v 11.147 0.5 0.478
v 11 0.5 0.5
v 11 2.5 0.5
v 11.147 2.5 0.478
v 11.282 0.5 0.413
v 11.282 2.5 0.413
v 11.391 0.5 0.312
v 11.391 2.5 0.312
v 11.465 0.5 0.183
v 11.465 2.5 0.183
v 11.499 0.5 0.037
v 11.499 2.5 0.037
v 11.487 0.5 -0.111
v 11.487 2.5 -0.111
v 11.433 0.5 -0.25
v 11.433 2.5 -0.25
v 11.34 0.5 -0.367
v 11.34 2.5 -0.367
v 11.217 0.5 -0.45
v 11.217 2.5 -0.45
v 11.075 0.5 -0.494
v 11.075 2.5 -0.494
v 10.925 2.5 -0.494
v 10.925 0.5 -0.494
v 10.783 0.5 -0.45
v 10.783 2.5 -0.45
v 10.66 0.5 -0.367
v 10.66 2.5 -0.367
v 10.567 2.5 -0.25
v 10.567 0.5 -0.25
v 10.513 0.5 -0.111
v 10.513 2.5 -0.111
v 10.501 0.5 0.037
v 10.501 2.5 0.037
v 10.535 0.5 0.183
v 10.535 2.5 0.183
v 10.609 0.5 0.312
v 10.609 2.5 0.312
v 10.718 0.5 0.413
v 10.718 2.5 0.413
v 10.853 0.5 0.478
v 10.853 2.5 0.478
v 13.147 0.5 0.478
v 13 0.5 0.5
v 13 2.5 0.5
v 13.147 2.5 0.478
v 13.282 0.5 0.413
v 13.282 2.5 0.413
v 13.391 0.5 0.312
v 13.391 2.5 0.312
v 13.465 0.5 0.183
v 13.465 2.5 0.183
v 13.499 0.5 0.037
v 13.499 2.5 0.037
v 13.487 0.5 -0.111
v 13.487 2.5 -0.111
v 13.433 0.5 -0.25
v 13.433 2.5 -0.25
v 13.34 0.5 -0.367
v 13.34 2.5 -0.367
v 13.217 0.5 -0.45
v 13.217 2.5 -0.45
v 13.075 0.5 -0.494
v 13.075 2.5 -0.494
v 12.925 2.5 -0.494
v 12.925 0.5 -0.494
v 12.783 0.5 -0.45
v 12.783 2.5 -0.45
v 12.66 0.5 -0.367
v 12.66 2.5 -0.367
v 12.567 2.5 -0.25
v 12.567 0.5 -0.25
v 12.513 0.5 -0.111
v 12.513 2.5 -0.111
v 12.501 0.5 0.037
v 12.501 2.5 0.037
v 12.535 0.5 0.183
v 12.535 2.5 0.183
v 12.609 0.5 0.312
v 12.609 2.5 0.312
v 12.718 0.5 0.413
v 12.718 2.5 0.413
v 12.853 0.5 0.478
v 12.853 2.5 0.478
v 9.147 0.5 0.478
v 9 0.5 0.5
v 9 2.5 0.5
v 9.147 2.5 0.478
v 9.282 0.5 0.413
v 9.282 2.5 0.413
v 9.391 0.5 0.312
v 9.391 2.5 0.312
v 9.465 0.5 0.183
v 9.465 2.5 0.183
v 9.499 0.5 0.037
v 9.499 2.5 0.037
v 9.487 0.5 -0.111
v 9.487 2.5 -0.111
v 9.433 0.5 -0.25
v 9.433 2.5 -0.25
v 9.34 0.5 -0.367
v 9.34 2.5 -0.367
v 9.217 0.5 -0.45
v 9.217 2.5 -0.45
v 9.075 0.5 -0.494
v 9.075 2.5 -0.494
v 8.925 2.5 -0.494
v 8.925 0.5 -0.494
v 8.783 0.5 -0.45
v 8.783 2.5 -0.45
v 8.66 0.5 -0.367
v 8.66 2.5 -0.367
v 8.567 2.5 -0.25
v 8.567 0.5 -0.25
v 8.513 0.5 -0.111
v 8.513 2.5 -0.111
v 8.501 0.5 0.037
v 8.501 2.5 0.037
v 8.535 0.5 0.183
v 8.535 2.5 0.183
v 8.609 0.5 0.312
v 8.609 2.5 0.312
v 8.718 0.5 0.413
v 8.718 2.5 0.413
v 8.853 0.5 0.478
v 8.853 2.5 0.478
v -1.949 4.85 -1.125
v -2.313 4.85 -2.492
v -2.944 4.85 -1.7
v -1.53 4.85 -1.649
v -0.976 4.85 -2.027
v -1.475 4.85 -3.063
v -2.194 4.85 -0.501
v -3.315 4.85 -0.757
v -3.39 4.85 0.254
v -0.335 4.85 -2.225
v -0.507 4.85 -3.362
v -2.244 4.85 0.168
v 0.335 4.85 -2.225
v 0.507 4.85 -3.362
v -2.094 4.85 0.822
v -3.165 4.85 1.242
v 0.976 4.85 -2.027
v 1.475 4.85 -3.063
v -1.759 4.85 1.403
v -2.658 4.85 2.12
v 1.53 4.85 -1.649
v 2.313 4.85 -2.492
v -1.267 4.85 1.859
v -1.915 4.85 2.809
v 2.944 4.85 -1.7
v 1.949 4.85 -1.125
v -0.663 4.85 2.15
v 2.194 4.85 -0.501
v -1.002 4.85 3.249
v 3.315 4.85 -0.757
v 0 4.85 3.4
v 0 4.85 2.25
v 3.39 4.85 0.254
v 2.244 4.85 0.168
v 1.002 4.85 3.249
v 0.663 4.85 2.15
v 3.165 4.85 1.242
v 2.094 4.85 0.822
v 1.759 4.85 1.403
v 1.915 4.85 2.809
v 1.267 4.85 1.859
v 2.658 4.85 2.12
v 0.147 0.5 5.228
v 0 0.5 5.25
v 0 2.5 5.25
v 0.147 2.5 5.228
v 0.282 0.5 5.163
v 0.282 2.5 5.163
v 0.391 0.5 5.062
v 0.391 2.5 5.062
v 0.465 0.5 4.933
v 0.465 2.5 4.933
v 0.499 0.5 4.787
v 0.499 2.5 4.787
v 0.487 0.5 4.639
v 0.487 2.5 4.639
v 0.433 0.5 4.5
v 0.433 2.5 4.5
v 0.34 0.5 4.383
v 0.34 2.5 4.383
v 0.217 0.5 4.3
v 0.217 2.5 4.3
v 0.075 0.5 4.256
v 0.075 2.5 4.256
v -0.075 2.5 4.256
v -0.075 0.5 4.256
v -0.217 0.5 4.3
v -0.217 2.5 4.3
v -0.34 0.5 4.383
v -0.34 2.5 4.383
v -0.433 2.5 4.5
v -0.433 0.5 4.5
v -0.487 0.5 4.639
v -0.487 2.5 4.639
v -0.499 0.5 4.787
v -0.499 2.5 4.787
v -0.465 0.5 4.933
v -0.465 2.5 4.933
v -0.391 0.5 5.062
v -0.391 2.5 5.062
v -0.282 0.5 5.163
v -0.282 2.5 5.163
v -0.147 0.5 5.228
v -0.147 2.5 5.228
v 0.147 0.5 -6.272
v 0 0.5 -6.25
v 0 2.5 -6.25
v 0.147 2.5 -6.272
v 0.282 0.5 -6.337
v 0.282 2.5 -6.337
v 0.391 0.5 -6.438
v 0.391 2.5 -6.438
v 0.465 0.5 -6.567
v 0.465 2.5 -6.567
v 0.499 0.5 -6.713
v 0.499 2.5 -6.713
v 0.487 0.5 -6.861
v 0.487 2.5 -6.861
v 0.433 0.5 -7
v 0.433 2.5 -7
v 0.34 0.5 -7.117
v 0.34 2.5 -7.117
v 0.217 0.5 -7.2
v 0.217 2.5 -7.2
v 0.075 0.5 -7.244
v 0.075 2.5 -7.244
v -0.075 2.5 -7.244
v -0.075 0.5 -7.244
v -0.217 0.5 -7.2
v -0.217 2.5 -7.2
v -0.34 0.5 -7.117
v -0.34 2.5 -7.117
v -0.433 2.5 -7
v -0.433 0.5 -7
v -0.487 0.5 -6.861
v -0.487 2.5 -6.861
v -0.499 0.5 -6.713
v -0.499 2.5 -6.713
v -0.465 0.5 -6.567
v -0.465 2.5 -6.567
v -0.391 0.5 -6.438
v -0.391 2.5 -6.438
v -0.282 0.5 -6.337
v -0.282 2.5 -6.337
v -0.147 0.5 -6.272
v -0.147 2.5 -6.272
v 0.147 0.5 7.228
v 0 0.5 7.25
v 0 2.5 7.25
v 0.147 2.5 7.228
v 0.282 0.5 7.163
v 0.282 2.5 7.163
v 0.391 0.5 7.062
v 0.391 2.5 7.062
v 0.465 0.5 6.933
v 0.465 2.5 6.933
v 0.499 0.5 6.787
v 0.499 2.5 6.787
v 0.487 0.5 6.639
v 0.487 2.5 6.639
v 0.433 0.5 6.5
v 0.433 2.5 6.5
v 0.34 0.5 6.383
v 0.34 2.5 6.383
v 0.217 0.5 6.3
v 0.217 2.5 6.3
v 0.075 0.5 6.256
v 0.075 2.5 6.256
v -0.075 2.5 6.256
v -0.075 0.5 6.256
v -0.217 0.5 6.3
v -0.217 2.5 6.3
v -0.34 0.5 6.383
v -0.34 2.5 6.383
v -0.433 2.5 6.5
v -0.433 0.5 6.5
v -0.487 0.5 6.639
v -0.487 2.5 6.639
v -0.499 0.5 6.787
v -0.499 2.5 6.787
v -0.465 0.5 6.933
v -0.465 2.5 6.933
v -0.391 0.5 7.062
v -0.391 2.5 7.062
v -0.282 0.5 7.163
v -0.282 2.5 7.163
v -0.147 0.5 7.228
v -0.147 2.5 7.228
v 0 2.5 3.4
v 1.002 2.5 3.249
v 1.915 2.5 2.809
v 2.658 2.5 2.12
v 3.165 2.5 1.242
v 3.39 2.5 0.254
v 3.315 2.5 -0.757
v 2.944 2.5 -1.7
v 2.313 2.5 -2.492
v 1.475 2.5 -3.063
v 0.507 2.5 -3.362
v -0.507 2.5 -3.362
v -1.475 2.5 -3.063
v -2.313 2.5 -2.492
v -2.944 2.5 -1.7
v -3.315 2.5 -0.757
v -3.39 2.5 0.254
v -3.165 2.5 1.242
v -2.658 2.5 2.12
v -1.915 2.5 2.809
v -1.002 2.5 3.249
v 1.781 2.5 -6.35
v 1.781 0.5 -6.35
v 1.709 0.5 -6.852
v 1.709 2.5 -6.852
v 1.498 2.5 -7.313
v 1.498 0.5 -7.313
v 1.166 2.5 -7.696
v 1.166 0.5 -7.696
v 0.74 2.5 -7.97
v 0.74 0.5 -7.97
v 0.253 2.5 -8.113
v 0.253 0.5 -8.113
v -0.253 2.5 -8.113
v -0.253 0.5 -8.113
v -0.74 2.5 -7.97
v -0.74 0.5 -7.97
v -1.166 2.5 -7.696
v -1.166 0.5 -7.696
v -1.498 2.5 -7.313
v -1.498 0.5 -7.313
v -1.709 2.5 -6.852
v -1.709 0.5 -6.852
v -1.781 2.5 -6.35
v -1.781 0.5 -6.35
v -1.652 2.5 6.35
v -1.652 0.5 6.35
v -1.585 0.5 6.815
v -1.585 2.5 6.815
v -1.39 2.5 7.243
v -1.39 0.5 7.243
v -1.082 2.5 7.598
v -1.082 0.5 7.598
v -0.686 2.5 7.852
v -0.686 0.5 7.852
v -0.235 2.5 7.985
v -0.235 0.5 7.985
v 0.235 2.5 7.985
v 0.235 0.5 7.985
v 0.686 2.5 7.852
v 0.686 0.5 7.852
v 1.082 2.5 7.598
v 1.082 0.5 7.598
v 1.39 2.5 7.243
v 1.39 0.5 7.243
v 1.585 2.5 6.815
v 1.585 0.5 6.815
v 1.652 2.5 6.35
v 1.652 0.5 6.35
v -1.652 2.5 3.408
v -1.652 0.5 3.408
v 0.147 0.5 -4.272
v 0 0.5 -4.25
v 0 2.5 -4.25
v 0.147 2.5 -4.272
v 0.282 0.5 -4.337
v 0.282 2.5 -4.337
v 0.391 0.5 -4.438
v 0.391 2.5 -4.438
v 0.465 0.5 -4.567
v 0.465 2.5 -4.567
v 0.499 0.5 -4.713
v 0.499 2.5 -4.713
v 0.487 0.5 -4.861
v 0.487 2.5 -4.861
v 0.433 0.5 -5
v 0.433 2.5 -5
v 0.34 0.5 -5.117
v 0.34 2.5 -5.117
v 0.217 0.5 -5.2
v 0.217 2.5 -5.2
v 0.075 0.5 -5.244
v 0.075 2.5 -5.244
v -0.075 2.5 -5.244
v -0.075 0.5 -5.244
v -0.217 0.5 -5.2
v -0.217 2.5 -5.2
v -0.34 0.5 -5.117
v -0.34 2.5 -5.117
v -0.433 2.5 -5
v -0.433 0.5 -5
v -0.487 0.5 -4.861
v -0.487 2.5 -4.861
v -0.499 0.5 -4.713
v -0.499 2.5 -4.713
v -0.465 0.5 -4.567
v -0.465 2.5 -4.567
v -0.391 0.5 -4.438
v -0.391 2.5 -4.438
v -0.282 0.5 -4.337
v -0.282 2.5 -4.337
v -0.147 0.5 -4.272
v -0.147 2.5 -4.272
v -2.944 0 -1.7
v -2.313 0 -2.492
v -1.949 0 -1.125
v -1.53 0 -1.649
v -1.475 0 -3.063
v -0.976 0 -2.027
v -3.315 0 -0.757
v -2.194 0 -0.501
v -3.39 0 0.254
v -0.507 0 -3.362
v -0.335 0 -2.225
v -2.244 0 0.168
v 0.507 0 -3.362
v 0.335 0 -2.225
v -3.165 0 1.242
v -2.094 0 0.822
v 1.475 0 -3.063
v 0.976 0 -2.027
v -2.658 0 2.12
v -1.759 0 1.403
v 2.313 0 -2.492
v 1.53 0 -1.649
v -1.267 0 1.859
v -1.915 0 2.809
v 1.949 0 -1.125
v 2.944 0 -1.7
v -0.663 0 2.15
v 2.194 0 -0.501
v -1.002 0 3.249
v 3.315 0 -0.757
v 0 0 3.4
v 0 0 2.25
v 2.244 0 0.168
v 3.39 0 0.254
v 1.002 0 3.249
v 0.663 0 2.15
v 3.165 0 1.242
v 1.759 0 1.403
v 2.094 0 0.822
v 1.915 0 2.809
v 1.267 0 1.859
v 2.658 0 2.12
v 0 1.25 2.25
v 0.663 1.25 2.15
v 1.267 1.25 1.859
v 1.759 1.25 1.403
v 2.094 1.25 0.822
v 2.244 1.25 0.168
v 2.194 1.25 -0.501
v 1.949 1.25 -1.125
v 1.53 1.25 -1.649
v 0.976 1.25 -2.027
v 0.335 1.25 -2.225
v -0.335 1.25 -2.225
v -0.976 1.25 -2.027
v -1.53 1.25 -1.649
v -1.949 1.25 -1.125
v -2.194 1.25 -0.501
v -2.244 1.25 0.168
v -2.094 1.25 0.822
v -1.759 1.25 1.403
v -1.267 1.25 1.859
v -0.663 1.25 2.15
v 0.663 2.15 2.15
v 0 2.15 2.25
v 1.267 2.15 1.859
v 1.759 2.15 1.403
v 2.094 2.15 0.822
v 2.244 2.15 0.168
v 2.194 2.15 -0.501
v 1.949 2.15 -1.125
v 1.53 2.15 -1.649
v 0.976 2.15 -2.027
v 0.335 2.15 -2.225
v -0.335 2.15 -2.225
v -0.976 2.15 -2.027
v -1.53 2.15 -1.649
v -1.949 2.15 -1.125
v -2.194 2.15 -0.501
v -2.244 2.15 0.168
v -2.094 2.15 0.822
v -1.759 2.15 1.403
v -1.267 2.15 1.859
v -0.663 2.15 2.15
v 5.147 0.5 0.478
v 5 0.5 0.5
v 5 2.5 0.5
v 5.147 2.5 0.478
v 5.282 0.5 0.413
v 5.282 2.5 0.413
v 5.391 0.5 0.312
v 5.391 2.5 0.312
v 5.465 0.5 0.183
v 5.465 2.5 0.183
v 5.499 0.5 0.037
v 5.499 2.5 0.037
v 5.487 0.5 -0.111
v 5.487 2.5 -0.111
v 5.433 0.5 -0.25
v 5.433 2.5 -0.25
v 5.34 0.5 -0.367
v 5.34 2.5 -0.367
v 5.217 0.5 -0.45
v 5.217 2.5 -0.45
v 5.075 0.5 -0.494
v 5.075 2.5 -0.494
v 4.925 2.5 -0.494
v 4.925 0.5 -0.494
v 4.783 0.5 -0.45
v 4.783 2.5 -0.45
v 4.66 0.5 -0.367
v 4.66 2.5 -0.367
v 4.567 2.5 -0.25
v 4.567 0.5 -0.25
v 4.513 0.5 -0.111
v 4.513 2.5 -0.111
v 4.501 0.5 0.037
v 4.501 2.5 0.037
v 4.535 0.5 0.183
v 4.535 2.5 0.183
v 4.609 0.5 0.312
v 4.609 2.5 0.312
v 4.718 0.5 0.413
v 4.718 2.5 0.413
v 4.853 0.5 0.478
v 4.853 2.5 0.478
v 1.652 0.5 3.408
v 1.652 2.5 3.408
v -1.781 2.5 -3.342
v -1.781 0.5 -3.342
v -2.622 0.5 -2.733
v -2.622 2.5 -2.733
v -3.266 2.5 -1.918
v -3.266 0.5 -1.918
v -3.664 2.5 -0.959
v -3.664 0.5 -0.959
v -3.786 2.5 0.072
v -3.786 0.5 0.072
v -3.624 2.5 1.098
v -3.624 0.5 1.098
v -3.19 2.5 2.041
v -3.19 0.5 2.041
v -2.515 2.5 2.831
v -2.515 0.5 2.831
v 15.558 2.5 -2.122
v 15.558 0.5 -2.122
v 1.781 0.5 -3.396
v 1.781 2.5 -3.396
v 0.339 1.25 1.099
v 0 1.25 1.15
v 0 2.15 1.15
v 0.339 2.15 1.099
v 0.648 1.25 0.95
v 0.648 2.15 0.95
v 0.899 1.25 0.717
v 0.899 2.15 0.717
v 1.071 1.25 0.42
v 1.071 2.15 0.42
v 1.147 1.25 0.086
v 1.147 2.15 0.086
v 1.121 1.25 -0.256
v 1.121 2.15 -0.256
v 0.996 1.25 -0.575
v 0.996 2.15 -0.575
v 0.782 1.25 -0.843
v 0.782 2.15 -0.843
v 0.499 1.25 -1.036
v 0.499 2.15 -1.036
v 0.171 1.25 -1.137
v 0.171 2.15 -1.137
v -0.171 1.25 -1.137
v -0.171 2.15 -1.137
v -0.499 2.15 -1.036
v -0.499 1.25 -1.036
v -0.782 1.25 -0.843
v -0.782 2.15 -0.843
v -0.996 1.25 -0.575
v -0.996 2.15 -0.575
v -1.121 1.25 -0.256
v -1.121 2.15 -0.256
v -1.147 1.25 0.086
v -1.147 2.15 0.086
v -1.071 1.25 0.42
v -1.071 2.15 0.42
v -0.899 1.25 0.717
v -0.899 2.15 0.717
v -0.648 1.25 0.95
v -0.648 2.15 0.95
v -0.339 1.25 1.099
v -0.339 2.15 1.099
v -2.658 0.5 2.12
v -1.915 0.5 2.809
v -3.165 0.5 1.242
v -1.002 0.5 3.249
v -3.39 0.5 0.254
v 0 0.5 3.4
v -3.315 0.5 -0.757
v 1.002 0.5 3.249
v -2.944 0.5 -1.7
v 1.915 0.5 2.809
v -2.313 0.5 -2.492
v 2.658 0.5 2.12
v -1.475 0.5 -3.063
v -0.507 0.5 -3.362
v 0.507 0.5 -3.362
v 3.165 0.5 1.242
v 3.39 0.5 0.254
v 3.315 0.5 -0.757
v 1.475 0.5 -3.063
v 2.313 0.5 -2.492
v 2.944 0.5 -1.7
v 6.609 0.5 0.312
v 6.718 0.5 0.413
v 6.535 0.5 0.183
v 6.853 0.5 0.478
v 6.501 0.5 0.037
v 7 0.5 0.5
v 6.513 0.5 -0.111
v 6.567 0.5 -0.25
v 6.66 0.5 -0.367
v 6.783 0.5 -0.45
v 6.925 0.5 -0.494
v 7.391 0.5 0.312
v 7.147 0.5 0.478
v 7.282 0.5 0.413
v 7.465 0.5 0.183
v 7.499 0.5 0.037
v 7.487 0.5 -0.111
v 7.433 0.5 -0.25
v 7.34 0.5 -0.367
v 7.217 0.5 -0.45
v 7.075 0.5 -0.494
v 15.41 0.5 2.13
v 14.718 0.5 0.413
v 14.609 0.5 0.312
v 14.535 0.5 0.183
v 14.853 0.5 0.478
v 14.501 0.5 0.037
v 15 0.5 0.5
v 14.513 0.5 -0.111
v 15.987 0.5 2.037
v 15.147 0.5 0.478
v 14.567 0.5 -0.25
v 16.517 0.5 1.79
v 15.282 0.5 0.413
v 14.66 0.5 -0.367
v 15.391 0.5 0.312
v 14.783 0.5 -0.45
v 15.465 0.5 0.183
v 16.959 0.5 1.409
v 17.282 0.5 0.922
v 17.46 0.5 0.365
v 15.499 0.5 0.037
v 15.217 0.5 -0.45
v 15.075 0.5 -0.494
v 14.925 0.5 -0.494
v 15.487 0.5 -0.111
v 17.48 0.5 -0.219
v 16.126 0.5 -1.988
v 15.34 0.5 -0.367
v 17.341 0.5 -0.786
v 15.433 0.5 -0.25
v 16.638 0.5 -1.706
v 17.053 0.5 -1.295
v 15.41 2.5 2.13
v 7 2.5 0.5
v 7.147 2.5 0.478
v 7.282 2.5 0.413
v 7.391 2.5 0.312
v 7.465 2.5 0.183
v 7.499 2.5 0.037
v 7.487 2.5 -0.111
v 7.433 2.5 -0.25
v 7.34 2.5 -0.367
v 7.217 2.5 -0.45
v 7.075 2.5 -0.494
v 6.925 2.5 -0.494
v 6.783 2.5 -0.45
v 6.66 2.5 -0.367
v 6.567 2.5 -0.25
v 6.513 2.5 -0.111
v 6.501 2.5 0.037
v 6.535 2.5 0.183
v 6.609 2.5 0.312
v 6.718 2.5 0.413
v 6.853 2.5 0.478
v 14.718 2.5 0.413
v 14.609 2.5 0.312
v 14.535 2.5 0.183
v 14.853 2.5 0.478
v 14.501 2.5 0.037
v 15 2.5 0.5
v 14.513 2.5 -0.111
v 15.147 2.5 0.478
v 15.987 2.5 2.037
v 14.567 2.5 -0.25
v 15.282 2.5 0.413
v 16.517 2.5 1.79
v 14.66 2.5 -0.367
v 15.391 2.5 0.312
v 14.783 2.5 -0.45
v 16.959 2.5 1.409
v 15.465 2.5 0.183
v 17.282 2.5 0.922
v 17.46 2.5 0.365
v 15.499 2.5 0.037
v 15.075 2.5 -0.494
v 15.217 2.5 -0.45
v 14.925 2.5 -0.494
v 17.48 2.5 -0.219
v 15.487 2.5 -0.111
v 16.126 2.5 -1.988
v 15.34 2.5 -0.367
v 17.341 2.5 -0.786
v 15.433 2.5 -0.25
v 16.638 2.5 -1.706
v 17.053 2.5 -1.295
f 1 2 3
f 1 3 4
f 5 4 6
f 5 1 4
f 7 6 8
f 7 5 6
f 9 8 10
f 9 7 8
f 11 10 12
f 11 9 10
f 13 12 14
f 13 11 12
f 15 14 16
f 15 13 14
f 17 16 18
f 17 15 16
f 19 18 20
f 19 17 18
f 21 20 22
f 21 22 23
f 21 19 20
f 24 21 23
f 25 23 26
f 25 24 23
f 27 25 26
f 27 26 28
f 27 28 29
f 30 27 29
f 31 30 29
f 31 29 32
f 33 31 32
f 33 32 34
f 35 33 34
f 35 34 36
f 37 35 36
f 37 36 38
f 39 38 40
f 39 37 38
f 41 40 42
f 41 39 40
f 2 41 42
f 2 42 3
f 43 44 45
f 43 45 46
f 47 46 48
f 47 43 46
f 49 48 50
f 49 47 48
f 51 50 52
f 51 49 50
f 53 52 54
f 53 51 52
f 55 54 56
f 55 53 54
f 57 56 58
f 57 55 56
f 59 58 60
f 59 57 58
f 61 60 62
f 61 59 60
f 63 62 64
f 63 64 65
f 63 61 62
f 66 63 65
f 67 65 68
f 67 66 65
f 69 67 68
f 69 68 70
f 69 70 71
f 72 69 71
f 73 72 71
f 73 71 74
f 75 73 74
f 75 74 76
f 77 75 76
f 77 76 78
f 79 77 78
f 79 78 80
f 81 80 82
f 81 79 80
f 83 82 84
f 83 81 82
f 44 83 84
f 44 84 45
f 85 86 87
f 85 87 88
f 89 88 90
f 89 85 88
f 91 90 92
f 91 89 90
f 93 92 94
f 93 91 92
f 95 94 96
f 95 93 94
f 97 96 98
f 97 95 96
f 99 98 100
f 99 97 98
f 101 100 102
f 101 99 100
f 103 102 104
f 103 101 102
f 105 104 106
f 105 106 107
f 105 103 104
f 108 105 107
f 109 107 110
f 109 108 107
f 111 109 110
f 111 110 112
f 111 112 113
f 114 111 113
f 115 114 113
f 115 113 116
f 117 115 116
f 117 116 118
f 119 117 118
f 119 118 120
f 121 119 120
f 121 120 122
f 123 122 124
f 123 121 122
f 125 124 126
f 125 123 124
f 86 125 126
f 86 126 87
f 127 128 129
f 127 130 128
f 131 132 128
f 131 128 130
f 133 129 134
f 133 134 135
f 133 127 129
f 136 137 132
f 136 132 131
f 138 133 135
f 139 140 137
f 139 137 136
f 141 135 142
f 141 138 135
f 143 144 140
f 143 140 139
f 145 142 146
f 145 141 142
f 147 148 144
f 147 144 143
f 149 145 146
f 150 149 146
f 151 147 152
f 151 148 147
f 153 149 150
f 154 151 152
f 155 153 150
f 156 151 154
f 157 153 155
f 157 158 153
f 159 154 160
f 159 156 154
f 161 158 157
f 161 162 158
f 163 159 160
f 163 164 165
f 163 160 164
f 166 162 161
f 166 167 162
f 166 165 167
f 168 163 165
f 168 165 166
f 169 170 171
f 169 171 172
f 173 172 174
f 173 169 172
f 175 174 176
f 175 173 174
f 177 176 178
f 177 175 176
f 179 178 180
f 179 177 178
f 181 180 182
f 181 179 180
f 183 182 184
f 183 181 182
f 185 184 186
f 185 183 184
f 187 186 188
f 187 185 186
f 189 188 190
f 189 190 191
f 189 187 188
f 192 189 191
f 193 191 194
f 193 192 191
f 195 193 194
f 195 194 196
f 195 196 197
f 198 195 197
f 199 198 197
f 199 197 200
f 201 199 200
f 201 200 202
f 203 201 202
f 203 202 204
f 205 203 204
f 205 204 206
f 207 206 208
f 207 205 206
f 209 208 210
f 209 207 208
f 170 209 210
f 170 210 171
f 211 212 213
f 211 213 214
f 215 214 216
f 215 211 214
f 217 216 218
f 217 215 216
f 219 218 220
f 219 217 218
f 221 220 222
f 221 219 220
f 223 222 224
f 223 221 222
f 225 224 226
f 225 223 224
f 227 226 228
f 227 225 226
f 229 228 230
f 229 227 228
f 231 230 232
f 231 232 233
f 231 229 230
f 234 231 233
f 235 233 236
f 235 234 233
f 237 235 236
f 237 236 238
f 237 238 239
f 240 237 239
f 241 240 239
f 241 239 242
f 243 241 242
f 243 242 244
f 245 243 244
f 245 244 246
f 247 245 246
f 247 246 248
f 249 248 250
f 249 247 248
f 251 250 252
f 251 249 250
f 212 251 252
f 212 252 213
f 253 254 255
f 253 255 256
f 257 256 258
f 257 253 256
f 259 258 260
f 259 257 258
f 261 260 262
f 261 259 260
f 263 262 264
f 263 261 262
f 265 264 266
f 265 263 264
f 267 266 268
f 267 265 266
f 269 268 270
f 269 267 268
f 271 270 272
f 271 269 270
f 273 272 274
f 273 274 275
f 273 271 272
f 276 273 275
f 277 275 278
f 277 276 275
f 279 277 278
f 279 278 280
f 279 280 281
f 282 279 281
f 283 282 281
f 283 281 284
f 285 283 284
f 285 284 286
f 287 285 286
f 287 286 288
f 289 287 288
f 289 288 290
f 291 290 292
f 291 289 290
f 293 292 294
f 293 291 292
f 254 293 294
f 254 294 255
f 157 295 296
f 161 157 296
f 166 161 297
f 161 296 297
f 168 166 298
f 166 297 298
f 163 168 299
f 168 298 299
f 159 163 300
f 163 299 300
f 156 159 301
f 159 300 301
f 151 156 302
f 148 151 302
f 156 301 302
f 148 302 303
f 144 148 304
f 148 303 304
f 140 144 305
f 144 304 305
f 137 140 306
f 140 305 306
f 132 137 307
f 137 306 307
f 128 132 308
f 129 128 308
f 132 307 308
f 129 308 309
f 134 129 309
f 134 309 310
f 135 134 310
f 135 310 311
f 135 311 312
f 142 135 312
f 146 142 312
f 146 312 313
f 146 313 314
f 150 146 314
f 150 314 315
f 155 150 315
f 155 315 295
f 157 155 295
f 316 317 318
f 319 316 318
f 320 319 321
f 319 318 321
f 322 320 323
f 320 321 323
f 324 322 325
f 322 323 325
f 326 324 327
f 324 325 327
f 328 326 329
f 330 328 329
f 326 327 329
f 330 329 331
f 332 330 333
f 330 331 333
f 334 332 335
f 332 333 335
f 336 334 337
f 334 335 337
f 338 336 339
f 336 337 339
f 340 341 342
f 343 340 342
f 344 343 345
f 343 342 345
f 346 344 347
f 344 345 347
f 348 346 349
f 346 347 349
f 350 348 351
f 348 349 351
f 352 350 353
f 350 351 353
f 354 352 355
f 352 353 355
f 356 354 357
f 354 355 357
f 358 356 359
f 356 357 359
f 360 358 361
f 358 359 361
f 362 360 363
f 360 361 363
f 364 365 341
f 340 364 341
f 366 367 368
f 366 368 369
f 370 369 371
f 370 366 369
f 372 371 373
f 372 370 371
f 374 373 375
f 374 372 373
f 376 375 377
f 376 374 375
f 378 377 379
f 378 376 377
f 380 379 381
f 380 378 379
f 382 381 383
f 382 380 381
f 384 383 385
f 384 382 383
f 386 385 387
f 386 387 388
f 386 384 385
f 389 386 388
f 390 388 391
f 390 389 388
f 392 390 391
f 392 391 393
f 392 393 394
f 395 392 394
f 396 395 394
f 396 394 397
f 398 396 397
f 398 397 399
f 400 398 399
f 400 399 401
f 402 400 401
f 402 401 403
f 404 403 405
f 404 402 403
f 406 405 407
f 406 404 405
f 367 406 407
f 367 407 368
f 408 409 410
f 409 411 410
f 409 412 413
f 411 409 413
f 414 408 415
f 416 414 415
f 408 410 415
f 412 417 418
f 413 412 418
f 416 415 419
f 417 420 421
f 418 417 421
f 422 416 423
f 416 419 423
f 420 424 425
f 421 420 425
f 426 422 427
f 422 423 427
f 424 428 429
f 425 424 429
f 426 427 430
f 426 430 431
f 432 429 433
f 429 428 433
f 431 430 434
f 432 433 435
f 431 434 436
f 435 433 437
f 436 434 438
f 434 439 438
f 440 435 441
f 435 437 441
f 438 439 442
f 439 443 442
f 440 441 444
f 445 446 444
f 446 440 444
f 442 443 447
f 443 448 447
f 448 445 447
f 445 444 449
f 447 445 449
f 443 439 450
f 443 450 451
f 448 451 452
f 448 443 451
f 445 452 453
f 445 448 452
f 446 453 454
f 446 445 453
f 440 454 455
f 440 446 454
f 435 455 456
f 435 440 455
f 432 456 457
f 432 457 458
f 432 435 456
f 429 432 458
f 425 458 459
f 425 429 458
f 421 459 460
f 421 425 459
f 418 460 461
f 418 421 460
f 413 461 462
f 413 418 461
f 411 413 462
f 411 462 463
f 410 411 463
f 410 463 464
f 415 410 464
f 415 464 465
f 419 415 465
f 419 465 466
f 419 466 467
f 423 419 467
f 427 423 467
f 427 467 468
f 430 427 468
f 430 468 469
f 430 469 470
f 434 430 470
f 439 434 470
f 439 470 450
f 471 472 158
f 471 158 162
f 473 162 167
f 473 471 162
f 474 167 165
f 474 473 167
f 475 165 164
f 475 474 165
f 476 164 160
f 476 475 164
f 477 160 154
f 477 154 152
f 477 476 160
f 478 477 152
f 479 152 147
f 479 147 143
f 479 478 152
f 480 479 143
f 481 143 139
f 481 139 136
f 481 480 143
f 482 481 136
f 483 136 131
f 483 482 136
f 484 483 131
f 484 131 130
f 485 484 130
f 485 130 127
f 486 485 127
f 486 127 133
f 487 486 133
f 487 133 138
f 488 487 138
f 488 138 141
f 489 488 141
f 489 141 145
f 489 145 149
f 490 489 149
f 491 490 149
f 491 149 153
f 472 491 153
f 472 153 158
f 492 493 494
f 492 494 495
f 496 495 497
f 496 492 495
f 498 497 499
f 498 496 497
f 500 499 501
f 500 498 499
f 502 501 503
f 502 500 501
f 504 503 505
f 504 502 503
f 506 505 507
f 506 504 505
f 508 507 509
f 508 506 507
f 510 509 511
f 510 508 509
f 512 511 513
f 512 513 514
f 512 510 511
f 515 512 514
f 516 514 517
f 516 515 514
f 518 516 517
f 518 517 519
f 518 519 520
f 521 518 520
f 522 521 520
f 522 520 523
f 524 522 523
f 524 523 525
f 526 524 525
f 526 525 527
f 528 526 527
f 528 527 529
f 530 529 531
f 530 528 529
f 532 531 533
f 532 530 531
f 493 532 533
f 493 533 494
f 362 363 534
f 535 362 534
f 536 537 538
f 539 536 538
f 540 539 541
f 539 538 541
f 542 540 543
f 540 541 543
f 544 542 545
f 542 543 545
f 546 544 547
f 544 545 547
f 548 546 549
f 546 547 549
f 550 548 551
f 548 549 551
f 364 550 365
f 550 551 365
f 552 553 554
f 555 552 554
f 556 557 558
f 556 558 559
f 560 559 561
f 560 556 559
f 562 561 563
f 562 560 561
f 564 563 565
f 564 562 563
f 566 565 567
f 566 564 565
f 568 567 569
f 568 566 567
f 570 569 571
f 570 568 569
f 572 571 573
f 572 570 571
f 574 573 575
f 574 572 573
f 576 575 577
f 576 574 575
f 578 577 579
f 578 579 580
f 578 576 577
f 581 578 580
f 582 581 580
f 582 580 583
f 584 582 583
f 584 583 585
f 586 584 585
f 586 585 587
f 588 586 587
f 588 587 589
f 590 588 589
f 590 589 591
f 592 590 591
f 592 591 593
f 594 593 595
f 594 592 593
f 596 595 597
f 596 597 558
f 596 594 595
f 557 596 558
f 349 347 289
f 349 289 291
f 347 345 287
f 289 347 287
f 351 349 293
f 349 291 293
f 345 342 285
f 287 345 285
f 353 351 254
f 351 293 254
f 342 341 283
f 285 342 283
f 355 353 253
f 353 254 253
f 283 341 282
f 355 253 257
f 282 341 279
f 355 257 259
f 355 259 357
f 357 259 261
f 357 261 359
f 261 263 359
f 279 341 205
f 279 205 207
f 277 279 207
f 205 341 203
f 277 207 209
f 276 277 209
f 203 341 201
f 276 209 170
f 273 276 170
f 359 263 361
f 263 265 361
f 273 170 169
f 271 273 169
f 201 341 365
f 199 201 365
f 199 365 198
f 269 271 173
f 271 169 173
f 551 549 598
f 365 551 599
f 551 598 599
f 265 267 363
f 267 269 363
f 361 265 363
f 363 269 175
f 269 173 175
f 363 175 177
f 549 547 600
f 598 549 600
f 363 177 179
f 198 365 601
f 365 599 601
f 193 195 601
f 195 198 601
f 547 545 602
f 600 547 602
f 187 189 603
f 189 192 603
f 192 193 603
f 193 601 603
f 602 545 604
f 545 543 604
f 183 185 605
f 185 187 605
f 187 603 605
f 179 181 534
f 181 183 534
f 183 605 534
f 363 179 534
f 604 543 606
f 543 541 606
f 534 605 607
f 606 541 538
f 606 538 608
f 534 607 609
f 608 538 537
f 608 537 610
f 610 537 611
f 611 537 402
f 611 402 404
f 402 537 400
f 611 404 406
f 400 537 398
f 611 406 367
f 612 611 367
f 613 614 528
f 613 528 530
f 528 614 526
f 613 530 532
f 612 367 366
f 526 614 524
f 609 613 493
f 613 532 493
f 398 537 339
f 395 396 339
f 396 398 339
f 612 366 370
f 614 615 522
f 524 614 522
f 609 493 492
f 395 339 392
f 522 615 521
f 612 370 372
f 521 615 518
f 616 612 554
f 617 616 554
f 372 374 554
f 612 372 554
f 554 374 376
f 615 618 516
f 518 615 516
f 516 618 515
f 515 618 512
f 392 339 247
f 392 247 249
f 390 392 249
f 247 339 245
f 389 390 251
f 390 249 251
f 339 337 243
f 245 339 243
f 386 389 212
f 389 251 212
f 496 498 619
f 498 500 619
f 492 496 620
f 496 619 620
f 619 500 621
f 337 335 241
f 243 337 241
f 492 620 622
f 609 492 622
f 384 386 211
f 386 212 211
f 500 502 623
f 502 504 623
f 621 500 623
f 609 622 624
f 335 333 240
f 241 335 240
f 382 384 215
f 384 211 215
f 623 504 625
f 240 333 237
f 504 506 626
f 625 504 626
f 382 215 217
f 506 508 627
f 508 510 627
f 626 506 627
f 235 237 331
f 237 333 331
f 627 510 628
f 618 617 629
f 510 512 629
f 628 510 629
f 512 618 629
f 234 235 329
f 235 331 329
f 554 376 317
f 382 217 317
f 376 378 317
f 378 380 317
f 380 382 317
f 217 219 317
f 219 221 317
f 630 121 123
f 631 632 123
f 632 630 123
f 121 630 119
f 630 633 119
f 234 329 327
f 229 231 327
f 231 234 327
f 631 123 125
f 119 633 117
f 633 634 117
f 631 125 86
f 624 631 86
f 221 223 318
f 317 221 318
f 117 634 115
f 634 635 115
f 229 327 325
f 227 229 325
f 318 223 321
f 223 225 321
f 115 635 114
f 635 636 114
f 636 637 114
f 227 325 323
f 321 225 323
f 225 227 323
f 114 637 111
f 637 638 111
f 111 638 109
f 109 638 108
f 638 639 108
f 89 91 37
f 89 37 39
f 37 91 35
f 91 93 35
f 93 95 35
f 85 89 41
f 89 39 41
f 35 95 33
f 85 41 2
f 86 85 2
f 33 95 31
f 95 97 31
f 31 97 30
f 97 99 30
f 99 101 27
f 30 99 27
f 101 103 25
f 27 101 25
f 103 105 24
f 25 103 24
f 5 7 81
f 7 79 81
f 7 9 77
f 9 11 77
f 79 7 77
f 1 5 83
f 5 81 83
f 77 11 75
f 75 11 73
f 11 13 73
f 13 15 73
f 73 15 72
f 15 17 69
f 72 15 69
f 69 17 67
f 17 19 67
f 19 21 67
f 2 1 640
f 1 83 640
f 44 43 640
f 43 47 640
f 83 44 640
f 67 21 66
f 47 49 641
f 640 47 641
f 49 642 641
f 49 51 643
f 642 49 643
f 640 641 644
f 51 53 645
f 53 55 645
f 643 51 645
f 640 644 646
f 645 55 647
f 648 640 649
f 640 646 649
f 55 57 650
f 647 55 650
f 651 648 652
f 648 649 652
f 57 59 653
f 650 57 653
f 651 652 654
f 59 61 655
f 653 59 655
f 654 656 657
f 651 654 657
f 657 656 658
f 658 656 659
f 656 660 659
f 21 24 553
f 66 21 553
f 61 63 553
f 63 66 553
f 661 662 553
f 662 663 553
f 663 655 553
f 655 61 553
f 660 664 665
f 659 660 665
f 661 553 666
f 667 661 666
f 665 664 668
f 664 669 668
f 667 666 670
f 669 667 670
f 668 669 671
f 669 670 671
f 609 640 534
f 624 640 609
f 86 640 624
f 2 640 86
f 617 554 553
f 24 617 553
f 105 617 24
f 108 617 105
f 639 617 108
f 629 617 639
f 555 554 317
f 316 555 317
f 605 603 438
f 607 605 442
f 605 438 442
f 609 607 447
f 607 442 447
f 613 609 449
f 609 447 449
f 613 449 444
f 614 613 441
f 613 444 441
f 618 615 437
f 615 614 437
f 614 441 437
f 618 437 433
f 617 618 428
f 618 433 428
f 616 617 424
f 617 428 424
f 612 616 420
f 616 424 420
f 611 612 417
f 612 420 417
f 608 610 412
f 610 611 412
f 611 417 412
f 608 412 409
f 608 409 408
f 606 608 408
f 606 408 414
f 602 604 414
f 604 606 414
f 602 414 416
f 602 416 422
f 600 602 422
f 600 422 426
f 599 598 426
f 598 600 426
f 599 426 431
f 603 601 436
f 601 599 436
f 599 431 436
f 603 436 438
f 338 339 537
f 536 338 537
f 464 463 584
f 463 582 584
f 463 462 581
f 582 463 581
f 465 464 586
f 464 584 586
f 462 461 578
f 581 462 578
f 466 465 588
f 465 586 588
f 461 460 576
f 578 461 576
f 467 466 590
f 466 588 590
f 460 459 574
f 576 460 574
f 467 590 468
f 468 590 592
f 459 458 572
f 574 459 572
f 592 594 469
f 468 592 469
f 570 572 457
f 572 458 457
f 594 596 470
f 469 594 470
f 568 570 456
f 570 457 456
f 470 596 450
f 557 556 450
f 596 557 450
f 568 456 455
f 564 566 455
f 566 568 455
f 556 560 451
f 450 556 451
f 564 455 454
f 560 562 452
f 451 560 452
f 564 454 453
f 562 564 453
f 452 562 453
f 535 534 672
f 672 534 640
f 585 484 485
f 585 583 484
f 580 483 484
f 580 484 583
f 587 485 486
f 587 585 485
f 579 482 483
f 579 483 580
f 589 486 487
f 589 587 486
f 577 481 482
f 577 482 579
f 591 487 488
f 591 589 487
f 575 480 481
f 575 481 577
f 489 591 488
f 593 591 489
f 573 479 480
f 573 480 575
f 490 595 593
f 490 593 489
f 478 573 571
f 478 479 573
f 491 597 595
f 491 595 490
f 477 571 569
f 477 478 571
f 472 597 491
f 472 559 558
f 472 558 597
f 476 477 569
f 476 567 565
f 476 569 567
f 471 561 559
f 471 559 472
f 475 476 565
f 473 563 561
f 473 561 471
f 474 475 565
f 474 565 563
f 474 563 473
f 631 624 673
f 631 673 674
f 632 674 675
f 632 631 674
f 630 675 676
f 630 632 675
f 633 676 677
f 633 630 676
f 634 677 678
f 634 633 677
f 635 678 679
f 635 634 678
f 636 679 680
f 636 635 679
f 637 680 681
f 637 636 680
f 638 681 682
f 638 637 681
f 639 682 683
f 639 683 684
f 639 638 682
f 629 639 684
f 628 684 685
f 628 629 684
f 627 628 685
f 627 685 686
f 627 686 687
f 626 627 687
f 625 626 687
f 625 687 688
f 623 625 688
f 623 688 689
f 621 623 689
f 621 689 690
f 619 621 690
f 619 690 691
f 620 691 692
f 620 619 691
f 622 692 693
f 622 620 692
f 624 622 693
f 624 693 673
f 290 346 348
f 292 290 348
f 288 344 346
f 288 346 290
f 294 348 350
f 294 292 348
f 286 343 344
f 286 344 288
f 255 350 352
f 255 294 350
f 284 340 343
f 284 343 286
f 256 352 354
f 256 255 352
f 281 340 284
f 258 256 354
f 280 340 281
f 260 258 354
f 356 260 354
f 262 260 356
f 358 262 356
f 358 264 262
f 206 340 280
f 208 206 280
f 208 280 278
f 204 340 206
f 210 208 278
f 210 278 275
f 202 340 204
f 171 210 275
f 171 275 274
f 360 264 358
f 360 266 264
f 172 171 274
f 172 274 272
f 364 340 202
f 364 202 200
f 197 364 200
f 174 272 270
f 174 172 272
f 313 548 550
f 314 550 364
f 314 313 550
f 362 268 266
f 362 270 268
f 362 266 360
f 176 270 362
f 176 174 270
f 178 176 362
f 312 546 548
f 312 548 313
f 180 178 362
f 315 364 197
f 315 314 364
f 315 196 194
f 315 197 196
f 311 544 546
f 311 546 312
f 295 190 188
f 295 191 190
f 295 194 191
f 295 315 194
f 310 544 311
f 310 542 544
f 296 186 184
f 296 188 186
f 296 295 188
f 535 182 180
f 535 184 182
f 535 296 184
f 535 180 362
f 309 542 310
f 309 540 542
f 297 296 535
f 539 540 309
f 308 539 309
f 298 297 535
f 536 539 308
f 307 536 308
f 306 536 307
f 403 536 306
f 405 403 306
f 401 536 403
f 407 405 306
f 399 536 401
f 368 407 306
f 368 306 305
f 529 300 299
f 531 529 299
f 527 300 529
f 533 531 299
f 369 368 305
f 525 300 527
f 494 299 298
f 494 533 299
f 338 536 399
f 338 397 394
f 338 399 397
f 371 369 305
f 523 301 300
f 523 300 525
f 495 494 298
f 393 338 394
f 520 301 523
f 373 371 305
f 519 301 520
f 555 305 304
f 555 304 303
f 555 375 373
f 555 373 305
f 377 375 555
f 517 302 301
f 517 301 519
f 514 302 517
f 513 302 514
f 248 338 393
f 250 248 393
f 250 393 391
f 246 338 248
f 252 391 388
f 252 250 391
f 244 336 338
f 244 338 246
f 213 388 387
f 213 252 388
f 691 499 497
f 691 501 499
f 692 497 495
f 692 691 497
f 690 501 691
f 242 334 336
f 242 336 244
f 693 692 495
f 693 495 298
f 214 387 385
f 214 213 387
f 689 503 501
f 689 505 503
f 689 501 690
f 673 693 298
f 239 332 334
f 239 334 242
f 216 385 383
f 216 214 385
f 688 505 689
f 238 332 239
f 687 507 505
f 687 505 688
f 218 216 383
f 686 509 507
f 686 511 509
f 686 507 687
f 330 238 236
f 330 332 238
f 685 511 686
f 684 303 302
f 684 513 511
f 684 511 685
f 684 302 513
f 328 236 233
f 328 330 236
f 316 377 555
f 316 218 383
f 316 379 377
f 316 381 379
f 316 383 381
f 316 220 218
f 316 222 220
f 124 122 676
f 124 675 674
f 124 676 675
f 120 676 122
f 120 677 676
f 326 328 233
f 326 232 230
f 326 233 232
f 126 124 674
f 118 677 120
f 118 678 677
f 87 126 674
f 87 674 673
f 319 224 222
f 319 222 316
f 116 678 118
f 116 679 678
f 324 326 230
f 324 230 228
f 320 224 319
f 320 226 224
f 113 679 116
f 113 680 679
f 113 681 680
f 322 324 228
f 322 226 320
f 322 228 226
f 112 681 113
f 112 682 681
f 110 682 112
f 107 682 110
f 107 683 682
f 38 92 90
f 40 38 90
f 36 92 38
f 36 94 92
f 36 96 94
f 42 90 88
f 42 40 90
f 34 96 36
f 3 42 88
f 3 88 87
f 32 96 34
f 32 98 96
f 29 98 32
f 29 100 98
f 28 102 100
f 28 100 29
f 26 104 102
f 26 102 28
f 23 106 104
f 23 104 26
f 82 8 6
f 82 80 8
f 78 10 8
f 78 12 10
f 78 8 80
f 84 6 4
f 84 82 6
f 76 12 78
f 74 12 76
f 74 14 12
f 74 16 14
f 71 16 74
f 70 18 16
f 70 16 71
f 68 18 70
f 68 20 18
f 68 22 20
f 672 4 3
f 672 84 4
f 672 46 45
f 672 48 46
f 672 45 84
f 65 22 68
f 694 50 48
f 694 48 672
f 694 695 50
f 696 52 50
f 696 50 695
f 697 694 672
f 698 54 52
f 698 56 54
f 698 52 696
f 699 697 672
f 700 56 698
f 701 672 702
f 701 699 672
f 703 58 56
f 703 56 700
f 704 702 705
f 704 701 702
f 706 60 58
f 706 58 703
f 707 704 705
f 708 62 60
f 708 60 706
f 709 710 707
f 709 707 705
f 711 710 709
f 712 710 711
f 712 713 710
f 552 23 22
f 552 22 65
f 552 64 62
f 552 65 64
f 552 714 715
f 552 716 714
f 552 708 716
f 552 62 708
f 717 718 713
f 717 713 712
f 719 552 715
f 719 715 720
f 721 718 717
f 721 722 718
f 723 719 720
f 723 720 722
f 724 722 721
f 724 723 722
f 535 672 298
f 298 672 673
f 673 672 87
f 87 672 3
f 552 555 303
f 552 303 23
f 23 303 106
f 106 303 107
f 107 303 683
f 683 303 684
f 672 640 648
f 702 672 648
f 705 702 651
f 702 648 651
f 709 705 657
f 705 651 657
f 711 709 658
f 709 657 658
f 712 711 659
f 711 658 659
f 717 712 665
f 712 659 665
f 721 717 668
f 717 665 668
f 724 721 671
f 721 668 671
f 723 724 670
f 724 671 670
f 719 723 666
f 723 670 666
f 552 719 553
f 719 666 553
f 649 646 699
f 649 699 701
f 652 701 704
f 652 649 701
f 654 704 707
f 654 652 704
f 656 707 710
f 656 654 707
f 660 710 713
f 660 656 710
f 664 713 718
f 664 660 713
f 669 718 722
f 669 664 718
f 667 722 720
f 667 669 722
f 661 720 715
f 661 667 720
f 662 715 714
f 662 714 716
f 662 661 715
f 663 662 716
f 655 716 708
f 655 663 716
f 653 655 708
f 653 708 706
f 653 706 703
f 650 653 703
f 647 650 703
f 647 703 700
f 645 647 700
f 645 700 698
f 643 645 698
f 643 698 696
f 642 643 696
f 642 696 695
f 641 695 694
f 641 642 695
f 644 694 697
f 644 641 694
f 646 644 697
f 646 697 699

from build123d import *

# Parameters (mm, degrees)
SKETCH_1_R      = 3.4
SKETCH_1_R_2    = 2.25
EXTRUDE_1_DEPTH = 4.85
EXTRUDE_START   = 0.5
SKETCH_2_R      = 2.25
SKETCH_2_R_2    = 0.5
EXTRUDE_2_DEPTH = 2
EXTRUDE_START_2 = 1.25
SKETCH_3_R      = 2.25
SKETCH_3_R_2    = 1.15
EXTRUDE_3_DEPTH = 0.9


with BuildPart() as part:
    # 草图1 → 凸台-拉伸1 (new body)
    with BuildSketch(Plane(origin=(0, 0, 0), x_dir=(1, 0, 0), z_dir=(0, 1, 0))):
        with Locations(Location((0, 0, 0), (0, 0, 270))):
            Circle(SKETCH_1_R)
        with Locations(Location((0, 0, 0), (0, 0, 270))):
            Circle(SKETCH_1_R_2, mode=Mode.SUBTRACT)
    extrude(amount=EXTRUDE_1_DEPTH)

    # 草图2 → 凸台-拉伸2 (add)
    with BuildSketch(Plane(origin=(0, 0, 0), x_dir=(1, 0, 0), z_dir=(0, 1, 0)).offset(EXTRUDE_START)):
        with BuildLine():
            Line((1.781000011, 3.395903963), (1.781000011, 6.35))
            ThreePointArc((1.781000011, 6.35), (0, 8.13100001), (-1.781000011, 6.35))
            Line((-1.781000011, 6.35), (-1.781000011, 3.342130588))
            ThreePointArc((-1.781000011, 3.342130588), (-3.786362647, -0.072496957), (-1.651758938, -3.407857144))
            Line((-1.651758938, -3.407857144), (-1.651758938, -6.35))
            ThreePointArc((-1.651758938, -6.35), (0, -8.001758939), (1.651758938, -6.35))
            Line((1.651758938, -6.35), (1.651758938, -3.407857144))
            Line((1.651758938, -3.407857144), (15.410111856, -2.130295801))
            ThreePointArc((15.410111856, -2.130295801), (17.490132215, -0.073847388), (15.557558889, 2.121744812))
            Line((15.557558889, 2.121744812), (1.781000011, 3.395903963))
        make_face()
        with Locations(Location((0, 0, 0), (0, 0, 270))):
            Circle(SKETCH_2_R, mode=Mode.SUBTRACT)
        with Locations(Location((0, -6.75, 0), (0, 0, 270))):
            Circle(SKETCH_2_R_2, mode=Mode.SUBTRACT)
        with Locations(Location((0, -4.75, 0), (0, 0, 270))):
            Circle(SKETCH_2_R_2, mode=Mode.SUBTRACT)
        with Locations(Location((15, 0, 0), (0, 0, 270))):
            Circle(SKETCH_2_R_2, mode=Mode.SUBTRACT)
        with Locations(Location((13, 0, 0), (0, 0, 270))):
            Circle(SKETCH_2_R_2, mode=Mode.SUBTRACT)
        with Locations(Location((11, 0, 0), (0, 0, 270))):
            Circle(SKETCH_2_R_2, mode=Mode.SUBTRACT)
        with Locations(Location((9, 0, 0), (0, 0, 270))):
            Circle(SKETCH_2_R_2, mode=Mode.SUBTRACT)
        with Locations(Location((7, 0, 0), (0, 0, 270))):
            Circle(SKETCH_2_R_2, mode=Mode.SUBTRACT)
        with Locations(Location((5, 0, 0), (0, 0, 270))):
            Circle(SKETCH_2_R_2, mode=Mode.SUBTRACT)
        with Locations(Location((0, 6.75, 0), (0, 0, 270))):
            Circle(SKETCH_2_R_2, mode=Mode.SUBTRACT)
        with Locations(Location((0, 4.75, 0), (0, 0, 270))):
            Circle(SKETCH_2_R_2, mode=Mode.SUBTRACT)
    extrude(amount=EXTRUDE_2_DEPTH)

    # 草图3 → 凸台-拉伸3 (add)
    with BuildSketch(Plane(origin=(0, 0, 0), x_dir=(1, 0, 0), z_dir=(0, 1, 0)).offset(EXTRUDE_START_2)):
        with Locations(Location((0, 0, 0), (0, 0, 270))):
            Circle(SKETCH_3_R)
        with Locations(Location((0, 0, 0), (0, 0, 270))):
            Circle(SKETCH_3_R_2, mode=Mode.SUBTRACT)
    extrude(amount=EXTRUDE_3_DEPTH)


solid = part.part
